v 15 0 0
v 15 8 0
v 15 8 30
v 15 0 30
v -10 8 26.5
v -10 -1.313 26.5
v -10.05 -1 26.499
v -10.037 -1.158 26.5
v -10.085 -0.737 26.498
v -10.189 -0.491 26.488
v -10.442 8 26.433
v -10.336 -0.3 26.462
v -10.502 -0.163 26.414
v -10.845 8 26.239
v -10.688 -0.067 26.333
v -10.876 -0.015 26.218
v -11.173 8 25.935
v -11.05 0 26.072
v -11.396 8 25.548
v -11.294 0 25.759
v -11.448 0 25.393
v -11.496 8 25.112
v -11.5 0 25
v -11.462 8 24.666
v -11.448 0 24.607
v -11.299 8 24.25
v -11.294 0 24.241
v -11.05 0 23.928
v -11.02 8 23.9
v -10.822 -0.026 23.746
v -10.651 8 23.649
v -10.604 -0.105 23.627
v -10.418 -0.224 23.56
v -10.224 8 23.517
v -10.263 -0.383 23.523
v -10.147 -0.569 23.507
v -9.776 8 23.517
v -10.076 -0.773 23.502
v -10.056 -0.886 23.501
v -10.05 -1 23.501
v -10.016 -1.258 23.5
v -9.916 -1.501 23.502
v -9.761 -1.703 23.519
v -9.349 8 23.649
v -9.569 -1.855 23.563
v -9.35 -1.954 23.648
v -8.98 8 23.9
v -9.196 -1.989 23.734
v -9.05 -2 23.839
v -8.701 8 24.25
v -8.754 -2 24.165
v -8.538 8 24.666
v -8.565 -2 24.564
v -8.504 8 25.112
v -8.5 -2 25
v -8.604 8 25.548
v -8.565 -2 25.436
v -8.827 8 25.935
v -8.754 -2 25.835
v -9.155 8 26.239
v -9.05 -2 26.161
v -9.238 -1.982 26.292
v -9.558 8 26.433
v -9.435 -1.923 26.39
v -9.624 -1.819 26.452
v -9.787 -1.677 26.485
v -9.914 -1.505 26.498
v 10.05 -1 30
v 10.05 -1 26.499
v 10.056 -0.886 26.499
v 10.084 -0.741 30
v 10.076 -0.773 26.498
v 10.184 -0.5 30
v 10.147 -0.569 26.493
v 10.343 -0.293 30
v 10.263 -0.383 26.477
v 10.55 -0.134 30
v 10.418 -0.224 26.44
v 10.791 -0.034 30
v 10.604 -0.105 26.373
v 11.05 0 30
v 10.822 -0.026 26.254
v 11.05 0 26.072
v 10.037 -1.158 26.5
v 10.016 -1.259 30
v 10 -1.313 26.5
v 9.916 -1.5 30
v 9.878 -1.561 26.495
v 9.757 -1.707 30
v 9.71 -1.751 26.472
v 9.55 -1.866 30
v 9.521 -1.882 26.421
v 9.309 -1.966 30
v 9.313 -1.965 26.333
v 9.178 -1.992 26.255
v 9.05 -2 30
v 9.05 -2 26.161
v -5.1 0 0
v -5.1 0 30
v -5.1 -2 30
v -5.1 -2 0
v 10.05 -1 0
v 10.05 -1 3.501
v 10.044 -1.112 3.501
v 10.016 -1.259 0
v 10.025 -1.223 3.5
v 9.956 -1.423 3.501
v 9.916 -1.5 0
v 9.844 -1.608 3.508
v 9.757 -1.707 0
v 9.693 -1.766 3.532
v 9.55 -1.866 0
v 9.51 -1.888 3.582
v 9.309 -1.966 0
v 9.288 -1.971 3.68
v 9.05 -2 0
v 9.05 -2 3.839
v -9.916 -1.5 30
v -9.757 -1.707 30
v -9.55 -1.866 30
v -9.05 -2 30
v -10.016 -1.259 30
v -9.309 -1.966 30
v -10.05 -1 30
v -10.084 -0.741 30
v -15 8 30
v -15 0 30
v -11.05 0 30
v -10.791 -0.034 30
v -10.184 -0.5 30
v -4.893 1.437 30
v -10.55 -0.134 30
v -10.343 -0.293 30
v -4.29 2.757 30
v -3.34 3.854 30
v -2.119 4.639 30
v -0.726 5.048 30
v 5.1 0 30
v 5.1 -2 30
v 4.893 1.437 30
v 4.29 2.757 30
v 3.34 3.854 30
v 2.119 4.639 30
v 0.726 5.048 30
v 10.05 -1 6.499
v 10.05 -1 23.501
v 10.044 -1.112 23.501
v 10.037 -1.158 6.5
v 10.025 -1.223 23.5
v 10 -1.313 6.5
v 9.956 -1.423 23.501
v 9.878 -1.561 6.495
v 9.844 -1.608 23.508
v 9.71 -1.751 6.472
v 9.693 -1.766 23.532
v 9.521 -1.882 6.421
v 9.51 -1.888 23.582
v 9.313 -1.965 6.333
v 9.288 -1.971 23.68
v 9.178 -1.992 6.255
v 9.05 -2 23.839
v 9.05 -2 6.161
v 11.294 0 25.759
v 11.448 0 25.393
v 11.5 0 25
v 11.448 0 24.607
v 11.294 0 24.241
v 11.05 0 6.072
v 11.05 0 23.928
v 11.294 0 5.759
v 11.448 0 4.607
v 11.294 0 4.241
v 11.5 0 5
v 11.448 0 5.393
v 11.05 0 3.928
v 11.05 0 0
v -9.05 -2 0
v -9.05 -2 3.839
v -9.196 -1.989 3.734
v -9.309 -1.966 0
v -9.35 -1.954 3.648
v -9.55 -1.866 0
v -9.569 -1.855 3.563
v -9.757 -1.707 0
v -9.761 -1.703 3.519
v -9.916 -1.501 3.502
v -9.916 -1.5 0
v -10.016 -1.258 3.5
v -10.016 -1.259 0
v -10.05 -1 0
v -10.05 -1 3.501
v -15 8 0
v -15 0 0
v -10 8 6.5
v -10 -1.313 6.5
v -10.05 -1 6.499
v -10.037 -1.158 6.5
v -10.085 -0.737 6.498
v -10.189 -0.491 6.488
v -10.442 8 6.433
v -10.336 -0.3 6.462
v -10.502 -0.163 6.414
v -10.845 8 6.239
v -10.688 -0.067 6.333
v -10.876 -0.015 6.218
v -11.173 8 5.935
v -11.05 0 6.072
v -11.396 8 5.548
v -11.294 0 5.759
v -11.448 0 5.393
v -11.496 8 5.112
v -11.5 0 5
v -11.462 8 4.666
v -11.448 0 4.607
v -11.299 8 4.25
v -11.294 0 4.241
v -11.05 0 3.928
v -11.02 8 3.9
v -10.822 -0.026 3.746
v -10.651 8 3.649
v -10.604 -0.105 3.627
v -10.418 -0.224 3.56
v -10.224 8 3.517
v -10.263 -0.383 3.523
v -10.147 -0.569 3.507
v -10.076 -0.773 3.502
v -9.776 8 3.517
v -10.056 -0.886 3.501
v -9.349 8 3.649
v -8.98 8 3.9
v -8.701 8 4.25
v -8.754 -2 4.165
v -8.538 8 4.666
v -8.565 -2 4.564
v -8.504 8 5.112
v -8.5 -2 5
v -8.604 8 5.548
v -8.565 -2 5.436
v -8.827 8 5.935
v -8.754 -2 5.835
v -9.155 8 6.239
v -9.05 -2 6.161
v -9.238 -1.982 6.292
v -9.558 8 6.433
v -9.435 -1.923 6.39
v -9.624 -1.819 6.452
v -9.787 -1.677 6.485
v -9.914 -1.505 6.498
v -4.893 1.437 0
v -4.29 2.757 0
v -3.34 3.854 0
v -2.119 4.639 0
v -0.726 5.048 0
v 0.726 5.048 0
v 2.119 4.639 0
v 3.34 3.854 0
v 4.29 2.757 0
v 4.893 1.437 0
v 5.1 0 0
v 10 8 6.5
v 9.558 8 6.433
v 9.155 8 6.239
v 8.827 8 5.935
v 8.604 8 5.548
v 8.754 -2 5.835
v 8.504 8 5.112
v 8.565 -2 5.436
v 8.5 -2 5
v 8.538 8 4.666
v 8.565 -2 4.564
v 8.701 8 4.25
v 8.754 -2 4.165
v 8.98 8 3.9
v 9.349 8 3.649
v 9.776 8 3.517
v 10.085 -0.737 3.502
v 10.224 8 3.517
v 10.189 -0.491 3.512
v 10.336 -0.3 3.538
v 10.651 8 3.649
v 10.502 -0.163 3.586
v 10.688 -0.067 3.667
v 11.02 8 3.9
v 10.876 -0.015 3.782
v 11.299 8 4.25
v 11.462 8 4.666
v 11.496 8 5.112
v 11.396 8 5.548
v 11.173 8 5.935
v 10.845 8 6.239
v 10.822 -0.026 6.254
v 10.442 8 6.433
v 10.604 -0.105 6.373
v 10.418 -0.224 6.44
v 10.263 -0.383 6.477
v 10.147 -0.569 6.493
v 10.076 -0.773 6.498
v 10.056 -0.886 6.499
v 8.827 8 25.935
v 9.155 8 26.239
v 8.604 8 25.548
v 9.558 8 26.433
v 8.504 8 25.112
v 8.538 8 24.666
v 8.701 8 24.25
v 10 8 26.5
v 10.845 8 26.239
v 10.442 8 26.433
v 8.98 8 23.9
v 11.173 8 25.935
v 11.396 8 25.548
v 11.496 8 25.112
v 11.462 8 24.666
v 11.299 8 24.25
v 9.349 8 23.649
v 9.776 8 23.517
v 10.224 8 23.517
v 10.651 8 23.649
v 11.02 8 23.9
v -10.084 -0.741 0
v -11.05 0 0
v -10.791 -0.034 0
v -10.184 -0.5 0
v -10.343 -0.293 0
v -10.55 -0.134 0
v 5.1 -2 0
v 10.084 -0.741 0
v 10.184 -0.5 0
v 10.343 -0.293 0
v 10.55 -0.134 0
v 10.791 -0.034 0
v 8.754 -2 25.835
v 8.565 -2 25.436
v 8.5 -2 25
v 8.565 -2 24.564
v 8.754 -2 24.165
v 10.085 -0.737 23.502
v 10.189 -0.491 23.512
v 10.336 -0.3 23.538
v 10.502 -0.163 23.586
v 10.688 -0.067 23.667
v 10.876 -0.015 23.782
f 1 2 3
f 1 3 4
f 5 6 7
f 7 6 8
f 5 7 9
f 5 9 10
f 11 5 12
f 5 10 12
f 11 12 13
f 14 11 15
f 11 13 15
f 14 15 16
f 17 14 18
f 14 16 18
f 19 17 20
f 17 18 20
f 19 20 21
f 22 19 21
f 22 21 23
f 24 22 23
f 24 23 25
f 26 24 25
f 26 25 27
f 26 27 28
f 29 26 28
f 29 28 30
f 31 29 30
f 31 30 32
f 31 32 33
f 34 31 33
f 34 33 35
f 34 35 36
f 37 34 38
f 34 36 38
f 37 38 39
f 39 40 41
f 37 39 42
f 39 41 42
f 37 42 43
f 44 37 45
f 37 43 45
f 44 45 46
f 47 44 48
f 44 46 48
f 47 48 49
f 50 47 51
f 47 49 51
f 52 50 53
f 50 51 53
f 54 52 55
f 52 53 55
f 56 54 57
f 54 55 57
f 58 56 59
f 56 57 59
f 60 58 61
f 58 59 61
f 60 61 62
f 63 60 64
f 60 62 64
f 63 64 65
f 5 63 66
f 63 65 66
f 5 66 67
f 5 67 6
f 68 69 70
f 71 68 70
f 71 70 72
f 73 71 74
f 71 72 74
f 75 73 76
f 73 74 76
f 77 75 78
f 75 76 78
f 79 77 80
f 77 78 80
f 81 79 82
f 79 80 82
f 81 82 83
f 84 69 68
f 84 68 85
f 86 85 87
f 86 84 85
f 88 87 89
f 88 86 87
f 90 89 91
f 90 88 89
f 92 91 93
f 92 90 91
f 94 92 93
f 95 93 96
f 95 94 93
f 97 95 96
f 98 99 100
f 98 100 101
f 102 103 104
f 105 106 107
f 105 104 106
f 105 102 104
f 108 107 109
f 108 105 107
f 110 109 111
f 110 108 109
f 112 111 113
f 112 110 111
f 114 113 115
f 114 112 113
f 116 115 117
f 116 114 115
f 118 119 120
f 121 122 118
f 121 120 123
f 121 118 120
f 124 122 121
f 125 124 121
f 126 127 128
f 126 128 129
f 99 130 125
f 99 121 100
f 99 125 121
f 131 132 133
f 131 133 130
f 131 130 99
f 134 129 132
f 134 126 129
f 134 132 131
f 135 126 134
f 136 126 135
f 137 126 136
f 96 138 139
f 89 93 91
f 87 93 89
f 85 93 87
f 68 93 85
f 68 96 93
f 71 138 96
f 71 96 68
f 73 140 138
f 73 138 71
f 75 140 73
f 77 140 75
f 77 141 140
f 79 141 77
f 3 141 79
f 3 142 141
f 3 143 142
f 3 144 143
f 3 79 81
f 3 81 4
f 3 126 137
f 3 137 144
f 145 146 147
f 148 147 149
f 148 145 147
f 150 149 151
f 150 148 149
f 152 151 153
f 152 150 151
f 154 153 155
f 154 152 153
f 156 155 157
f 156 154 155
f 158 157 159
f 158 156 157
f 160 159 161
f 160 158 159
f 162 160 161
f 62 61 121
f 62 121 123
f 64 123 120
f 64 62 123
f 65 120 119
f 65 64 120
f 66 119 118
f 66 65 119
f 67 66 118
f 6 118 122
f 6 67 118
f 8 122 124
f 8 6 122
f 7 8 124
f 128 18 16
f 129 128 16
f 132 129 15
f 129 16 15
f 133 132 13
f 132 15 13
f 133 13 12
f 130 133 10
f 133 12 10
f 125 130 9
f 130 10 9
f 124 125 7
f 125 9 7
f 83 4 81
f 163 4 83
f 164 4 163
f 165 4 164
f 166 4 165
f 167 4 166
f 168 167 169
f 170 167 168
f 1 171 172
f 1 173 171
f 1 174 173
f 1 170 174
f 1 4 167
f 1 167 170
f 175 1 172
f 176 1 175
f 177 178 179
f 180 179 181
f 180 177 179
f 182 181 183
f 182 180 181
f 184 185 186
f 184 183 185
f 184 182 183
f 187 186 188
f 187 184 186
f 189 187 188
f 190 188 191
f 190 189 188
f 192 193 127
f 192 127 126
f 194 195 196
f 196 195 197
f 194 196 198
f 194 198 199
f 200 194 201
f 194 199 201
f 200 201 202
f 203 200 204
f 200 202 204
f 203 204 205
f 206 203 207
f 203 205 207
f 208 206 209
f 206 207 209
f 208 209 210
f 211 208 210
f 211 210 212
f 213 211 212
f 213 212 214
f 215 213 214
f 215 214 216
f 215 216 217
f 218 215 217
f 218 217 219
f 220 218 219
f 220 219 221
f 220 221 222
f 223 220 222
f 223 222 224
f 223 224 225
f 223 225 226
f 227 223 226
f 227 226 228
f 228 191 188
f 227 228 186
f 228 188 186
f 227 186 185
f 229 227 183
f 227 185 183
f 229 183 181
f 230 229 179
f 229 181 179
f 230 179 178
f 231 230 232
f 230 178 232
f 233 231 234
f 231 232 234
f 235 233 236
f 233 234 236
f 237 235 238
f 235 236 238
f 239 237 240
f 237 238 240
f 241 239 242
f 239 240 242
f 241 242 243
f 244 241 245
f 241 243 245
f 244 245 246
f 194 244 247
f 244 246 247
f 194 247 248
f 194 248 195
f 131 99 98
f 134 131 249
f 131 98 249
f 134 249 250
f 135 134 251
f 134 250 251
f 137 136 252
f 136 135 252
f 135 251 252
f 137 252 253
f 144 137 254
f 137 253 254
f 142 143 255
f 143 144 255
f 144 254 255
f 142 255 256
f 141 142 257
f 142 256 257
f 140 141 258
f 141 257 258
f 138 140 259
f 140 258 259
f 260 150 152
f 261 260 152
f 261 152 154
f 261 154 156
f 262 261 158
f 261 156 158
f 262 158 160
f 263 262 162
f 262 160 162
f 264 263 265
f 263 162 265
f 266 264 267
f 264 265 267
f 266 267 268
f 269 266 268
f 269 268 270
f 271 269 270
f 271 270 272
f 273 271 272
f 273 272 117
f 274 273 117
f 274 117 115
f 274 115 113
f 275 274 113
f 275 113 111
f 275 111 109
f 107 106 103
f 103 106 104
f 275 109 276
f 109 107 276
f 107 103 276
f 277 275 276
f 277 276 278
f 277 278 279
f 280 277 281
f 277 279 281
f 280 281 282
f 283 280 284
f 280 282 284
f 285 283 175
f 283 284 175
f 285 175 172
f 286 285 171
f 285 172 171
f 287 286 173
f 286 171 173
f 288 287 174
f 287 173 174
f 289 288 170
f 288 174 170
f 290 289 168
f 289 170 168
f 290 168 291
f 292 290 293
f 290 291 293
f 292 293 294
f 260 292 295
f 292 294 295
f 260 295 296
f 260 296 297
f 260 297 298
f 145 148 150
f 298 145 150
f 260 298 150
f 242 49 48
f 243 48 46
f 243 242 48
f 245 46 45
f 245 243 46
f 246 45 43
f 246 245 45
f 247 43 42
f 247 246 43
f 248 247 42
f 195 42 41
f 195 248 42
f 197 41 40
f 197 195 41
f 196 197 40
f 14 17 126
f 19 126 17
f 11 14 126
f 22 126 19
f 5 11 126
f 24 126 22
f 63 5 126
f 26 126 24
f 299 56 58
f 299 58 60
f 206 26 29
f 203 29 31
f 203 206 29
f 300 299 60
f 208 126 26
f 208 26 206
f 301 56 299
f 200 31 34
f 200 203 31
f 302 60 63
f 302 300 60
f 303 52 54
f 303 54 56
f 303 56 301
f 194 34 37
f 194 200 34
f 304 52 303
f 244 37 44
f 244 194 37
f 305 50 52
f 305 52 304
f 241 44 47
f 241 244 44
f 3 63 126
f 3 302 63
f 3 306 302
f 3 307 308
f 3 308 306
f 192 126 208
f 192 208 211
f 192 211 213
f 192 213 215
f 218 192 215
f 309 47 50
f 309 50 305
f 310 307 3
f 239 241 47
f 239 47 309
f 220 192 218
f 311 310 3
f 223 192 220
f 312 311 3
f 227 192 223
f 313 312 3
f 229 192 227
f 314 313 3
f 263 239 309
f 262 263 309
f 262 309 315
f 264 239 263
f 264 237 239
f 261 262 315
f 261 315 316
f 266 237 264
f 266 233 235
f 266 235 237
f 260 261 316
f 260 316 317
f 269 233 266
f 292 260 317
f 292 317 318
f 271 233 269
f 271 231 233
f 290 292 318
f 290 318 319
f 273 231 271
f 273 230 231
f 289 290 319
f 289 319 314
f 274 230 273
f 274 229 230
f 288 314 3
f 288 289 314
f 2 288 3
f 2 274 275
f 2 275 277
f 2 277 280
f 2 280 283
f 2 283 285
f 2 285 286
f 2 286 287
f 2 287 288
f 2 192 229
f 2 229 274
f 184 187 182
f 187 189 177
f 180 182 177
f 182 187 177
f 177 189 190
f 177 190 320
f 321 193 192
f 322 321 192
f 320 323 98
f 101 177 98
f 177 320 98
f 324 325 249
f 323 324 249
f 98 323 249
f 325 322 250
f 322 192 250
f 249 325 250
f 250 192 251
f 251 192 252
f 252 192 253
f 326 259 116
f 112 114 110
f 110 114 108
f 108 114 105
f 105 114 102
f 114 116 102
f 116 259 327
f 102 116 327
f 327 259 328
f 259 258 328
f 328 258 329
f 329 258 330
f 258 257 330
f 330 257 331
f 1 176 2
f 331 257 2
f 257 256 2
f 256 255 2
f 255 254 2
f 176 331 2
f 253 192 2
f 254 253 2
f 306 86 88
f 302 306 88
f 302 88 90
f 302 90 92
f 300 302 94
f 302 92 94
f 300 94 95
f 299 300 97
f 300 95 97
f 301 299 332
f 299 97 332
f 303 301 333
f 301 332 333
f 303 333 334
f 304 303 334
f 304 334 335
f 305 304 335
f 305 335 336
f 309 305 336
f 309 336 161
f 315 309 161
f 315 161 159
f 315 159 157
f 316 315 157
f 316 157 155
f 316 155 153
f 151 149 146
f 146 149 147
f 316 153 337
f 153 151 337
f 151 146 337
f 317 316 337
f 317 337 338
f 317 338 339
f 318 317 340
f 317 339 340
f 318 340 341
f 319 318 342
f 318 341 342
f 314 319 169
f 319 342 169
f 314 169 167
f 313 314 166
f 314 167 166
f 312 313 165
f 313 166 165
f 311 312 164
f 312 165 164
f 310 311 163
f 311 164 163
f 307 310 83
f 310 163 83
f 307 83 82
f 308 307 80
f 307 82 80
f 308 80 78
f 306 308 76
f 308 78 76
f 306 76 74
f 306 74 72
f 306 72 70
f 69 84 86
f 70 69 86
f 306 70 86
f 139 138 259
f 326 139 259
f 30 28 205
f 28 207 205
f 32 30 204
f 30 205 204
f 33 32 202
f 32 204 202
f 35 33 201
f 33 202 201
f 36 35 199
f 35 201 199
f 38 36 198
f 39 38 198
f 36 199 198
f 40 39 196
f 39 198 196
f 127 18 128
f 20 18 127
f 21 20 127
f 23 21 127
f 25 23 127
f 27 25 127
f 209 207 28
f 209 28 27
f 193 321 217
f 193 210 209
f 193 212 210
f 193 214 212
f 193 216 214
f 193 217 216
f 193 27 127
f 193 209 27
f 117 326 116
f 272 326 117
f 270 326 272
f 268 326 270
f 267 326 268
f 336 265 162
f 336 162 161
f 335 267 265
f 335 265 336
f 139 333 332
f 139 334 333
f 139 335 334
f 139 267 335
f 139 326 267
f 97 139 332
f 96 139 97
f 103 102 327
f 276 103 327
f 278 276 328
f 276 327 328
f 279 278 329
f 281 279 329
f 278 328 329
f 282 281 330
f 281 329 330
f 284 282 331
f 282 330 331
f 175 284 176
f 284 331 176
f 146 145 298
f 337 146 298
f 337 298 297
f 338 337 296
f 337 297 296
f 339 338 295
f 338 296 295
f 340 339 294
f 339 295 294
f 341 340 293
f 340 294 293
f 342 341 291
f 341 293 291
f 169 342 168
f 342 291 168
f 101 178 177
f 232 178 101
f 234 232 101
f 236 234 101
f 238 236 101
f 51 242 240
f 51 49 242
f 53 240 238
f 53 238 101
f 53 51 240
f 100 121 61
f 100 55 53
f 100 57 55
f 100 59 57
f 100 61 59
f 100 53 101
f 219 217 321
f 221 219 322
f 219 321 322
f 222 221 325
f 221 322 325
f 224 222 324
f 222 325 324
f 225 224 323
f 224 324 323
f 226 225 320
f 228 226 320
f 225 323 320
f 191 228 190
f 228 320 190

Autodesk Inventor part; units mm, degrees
ref_plane "YZ Plane" through (0, 0, 0) normal (1, 0, 0) x (0, 1, 0)
ref_plane "XZ Plane" through (0, 0, 0) normal (0, 1, 0) x (-1, 0, 0)
ref_plane "XY Plane" through (0, 0, 0) normal (0, 0, 1) x (1, 0, 0)
sketch "スケッチ1" plane through (0, 0, 0) normal (0, 0, 1) x (1, 0, 0)
  arc A0 (-5.1, 0) -> (5.1, 0) centre (0, 0) ccw
  line L0 (-15, 8) -> (15, 8)
  line L1 (15, 8) -> (15, 0)
  line L2 (15, 0) -> (5.1, 0)
  line L3 (-15, 0) -> (-15, 8)
  arc A1 (5.1, 0) -> (-5.1, 0) centre (0, 0) ccw
  line L4 (5.1, 0) -> (-5.1, 0)
  line L5 (-5.1, 0) -> (-15, 0)
  dimension "d0" = 10.2
  dimension "d1" = 30
  dimension "d2" = 15
  dimension "d3" = 8
  dimension "d4" = 0
extrude "押し出し1" add sketch "スケッチ1" along normal blind 30 contours L5 L3 L0 L1 L2 A1
sketch "スケッチ2" plane through (-15, 0, 0) normal (0, -1, 0) x (1, 0, 0)
  line L0 (9.9, 30) -> (0, 30) projected
  line L1 (0, 0) -> (9.9, 0) projected
  line L2 (0, 30) -> (4.95, 30)
  line L3 (4.95, 30) -> (4.95, 0)
  line L4 (4.95, 0) -> (0, 0)
  line L5 (0, 0) -> (0, 30)
  line L6 (30, 30) -> (25.05, 30)
  line L7 (25.05, 30) -> (25.05, 0)
  line L8 (25.05, 0) -> (30, 0)
  line L9 (30, 0) -> (30, 30)
  line L10 (4.95, 30) -> (9.9, 30)
  line L11 (9.9, 30) -> (9.9, 0)
  line L12 (9.9, 0) -> (4.95, 0)
  line L13 (4.95, 0) -> (4.95, 30)
  line L14 (25.05, 30) -> (20.1, 30)
  line L15 (20.1, 30) -> (20.1, 0)
  line L16 (20.1, 0) -> (25.05, 0)
  line L17 (25.05, 0) -> (25.05, 30)
  point P0 (15, 0)
  dimension "d7" = 30
  dimension "d8" = 4.95
  dimension "d34" = 4.95
extrude "押し出し2" add sketch "スケッチ2" along normal blind 2 contours L11 L1 L3 L0 | L7 L16 L15 L14
fillet "フィレット2" radius 1 4 edges at (-10.05, 0, 15) (-10.05, -2, 15) (10.05, 0, 15) (10.05, -2, 15)
sketch "スケッチ3" plane through (-15, 8, 0) normal (0, 1, 0) x (1, 0, 0)
  line L0 (0, -30) -> (30, -30) projected
  line L1 (30, 0) -> (30, -30) projected
  line L2 (30, 0) -> (0, 0) projected
  line L3 (0, 0) -> (0, -30) projected
  point P0 (15, 0)
  point P1 (5, -5)
  point P2 (5, -25)
  point P3 (25, -25)
  point P4 (25, -5)
  dimension "d11" = 5
  dimension "d12" = 5
  dimension "d13" = 5
  dimension "d14" = 5
  dimension "d15" = 5
  dimension "d16" = 5
  dimension "d17" = 5
  dimension "d18" = 5
hole "Hole3" at (-10, 8, 5) at (-10, 8, 25) at (10, 8, 25) at (10, 8, 5) direction (0, -1, 0) diameter 3 end through all
sketch "スケッチ4" plane through (0, 0, 30) normal (0, 0, 1) x (1, 0, 0)
  arc A0 (9.05, -2) -> (10.05, -1) centre (9.05, -1) ccw projected
  arc A1 (11.05, 0) -> (10.05, -1) centre (11.05, -1) ccw projected
  line L0 (15, 0) -> (11.05, 0) projected
  line L1 (15, 8) -> (15, 0) projected
  line L2 (-15, 8) -> (15, 8) projected
  line L3 (-15, 0) -> (-15, 8) projected
  line L4 (-11.05, 0) -> (-15, 0) projected
  arc A2 (-10.05, -1) -> (-11.05, 0) centre (-11.05, -1) ccw projected
  arc A3 (-10.05, -1) -> (-9.05, -2) centre (-9.05, -1) ccw projected
  line L5 (-9.05, -2) -> (-5.1, -2) projected
  line L6 (-5.1, 0) -> (-5.1, -2) projected
  arc A4 (5.1, 0) -> (-5.1, 0) centre (0, 0) ccw projected
  line L7 (5.1, 0) -> (5.1, -2) projected
  line L8 (5.1, -2) -> (9.05, -2) projected
  line L9 (-15, 0.1) -> (-10.95, 0.1)
  line L10 (-9.95, -0.9) -> (-9.95, -0.9)
  line L11 (-8.95, -1.9) -> (-5.1, -1.9)
  arc A5 (-9.95, -0.9) -> (-10.95, 0.1) centre (-10.95, -0.9) ccw
  arc A6 (-9.95, -0.9) -> (-8.95, -1.9) centre (-8.95, -0.9) ccw
  line L12 (0, 0) -> (0, 8)
  line L13 (15, 0.1) -> (10.95, 0.1)
  line L14 (8.95, -1.9) -> (5.1, -1.9)
  arc A7 (10.95, 0.1) -> (9.95, -0.9) centre (10.95, -0.9) ccw
  arc A8 (8.95, -1.9) -> (9.95, -0.9) centre (8.95, -0.9) ccw
  point P0 (-9.95, 0.1)
  dimension "d43" = 5.05
  dimension "d44" = 2.1
  dimension "d45" = 0.1
  dimension "d46" = 1
equation "\"d2\" = 0.5 * d1"
equation "\"d34\" = d8"
equation "\"d12\" = d11"
equation "\"d13\" = d11"
equation "\"d14\" = d13"
equation "\"d15\" = d11"
equation "\"d16\" = d11"
equation "\"d17\" = d11"
equation "\"d18\" = d11"
properties part number "poleHolderB" material "Aluminum-6061"
